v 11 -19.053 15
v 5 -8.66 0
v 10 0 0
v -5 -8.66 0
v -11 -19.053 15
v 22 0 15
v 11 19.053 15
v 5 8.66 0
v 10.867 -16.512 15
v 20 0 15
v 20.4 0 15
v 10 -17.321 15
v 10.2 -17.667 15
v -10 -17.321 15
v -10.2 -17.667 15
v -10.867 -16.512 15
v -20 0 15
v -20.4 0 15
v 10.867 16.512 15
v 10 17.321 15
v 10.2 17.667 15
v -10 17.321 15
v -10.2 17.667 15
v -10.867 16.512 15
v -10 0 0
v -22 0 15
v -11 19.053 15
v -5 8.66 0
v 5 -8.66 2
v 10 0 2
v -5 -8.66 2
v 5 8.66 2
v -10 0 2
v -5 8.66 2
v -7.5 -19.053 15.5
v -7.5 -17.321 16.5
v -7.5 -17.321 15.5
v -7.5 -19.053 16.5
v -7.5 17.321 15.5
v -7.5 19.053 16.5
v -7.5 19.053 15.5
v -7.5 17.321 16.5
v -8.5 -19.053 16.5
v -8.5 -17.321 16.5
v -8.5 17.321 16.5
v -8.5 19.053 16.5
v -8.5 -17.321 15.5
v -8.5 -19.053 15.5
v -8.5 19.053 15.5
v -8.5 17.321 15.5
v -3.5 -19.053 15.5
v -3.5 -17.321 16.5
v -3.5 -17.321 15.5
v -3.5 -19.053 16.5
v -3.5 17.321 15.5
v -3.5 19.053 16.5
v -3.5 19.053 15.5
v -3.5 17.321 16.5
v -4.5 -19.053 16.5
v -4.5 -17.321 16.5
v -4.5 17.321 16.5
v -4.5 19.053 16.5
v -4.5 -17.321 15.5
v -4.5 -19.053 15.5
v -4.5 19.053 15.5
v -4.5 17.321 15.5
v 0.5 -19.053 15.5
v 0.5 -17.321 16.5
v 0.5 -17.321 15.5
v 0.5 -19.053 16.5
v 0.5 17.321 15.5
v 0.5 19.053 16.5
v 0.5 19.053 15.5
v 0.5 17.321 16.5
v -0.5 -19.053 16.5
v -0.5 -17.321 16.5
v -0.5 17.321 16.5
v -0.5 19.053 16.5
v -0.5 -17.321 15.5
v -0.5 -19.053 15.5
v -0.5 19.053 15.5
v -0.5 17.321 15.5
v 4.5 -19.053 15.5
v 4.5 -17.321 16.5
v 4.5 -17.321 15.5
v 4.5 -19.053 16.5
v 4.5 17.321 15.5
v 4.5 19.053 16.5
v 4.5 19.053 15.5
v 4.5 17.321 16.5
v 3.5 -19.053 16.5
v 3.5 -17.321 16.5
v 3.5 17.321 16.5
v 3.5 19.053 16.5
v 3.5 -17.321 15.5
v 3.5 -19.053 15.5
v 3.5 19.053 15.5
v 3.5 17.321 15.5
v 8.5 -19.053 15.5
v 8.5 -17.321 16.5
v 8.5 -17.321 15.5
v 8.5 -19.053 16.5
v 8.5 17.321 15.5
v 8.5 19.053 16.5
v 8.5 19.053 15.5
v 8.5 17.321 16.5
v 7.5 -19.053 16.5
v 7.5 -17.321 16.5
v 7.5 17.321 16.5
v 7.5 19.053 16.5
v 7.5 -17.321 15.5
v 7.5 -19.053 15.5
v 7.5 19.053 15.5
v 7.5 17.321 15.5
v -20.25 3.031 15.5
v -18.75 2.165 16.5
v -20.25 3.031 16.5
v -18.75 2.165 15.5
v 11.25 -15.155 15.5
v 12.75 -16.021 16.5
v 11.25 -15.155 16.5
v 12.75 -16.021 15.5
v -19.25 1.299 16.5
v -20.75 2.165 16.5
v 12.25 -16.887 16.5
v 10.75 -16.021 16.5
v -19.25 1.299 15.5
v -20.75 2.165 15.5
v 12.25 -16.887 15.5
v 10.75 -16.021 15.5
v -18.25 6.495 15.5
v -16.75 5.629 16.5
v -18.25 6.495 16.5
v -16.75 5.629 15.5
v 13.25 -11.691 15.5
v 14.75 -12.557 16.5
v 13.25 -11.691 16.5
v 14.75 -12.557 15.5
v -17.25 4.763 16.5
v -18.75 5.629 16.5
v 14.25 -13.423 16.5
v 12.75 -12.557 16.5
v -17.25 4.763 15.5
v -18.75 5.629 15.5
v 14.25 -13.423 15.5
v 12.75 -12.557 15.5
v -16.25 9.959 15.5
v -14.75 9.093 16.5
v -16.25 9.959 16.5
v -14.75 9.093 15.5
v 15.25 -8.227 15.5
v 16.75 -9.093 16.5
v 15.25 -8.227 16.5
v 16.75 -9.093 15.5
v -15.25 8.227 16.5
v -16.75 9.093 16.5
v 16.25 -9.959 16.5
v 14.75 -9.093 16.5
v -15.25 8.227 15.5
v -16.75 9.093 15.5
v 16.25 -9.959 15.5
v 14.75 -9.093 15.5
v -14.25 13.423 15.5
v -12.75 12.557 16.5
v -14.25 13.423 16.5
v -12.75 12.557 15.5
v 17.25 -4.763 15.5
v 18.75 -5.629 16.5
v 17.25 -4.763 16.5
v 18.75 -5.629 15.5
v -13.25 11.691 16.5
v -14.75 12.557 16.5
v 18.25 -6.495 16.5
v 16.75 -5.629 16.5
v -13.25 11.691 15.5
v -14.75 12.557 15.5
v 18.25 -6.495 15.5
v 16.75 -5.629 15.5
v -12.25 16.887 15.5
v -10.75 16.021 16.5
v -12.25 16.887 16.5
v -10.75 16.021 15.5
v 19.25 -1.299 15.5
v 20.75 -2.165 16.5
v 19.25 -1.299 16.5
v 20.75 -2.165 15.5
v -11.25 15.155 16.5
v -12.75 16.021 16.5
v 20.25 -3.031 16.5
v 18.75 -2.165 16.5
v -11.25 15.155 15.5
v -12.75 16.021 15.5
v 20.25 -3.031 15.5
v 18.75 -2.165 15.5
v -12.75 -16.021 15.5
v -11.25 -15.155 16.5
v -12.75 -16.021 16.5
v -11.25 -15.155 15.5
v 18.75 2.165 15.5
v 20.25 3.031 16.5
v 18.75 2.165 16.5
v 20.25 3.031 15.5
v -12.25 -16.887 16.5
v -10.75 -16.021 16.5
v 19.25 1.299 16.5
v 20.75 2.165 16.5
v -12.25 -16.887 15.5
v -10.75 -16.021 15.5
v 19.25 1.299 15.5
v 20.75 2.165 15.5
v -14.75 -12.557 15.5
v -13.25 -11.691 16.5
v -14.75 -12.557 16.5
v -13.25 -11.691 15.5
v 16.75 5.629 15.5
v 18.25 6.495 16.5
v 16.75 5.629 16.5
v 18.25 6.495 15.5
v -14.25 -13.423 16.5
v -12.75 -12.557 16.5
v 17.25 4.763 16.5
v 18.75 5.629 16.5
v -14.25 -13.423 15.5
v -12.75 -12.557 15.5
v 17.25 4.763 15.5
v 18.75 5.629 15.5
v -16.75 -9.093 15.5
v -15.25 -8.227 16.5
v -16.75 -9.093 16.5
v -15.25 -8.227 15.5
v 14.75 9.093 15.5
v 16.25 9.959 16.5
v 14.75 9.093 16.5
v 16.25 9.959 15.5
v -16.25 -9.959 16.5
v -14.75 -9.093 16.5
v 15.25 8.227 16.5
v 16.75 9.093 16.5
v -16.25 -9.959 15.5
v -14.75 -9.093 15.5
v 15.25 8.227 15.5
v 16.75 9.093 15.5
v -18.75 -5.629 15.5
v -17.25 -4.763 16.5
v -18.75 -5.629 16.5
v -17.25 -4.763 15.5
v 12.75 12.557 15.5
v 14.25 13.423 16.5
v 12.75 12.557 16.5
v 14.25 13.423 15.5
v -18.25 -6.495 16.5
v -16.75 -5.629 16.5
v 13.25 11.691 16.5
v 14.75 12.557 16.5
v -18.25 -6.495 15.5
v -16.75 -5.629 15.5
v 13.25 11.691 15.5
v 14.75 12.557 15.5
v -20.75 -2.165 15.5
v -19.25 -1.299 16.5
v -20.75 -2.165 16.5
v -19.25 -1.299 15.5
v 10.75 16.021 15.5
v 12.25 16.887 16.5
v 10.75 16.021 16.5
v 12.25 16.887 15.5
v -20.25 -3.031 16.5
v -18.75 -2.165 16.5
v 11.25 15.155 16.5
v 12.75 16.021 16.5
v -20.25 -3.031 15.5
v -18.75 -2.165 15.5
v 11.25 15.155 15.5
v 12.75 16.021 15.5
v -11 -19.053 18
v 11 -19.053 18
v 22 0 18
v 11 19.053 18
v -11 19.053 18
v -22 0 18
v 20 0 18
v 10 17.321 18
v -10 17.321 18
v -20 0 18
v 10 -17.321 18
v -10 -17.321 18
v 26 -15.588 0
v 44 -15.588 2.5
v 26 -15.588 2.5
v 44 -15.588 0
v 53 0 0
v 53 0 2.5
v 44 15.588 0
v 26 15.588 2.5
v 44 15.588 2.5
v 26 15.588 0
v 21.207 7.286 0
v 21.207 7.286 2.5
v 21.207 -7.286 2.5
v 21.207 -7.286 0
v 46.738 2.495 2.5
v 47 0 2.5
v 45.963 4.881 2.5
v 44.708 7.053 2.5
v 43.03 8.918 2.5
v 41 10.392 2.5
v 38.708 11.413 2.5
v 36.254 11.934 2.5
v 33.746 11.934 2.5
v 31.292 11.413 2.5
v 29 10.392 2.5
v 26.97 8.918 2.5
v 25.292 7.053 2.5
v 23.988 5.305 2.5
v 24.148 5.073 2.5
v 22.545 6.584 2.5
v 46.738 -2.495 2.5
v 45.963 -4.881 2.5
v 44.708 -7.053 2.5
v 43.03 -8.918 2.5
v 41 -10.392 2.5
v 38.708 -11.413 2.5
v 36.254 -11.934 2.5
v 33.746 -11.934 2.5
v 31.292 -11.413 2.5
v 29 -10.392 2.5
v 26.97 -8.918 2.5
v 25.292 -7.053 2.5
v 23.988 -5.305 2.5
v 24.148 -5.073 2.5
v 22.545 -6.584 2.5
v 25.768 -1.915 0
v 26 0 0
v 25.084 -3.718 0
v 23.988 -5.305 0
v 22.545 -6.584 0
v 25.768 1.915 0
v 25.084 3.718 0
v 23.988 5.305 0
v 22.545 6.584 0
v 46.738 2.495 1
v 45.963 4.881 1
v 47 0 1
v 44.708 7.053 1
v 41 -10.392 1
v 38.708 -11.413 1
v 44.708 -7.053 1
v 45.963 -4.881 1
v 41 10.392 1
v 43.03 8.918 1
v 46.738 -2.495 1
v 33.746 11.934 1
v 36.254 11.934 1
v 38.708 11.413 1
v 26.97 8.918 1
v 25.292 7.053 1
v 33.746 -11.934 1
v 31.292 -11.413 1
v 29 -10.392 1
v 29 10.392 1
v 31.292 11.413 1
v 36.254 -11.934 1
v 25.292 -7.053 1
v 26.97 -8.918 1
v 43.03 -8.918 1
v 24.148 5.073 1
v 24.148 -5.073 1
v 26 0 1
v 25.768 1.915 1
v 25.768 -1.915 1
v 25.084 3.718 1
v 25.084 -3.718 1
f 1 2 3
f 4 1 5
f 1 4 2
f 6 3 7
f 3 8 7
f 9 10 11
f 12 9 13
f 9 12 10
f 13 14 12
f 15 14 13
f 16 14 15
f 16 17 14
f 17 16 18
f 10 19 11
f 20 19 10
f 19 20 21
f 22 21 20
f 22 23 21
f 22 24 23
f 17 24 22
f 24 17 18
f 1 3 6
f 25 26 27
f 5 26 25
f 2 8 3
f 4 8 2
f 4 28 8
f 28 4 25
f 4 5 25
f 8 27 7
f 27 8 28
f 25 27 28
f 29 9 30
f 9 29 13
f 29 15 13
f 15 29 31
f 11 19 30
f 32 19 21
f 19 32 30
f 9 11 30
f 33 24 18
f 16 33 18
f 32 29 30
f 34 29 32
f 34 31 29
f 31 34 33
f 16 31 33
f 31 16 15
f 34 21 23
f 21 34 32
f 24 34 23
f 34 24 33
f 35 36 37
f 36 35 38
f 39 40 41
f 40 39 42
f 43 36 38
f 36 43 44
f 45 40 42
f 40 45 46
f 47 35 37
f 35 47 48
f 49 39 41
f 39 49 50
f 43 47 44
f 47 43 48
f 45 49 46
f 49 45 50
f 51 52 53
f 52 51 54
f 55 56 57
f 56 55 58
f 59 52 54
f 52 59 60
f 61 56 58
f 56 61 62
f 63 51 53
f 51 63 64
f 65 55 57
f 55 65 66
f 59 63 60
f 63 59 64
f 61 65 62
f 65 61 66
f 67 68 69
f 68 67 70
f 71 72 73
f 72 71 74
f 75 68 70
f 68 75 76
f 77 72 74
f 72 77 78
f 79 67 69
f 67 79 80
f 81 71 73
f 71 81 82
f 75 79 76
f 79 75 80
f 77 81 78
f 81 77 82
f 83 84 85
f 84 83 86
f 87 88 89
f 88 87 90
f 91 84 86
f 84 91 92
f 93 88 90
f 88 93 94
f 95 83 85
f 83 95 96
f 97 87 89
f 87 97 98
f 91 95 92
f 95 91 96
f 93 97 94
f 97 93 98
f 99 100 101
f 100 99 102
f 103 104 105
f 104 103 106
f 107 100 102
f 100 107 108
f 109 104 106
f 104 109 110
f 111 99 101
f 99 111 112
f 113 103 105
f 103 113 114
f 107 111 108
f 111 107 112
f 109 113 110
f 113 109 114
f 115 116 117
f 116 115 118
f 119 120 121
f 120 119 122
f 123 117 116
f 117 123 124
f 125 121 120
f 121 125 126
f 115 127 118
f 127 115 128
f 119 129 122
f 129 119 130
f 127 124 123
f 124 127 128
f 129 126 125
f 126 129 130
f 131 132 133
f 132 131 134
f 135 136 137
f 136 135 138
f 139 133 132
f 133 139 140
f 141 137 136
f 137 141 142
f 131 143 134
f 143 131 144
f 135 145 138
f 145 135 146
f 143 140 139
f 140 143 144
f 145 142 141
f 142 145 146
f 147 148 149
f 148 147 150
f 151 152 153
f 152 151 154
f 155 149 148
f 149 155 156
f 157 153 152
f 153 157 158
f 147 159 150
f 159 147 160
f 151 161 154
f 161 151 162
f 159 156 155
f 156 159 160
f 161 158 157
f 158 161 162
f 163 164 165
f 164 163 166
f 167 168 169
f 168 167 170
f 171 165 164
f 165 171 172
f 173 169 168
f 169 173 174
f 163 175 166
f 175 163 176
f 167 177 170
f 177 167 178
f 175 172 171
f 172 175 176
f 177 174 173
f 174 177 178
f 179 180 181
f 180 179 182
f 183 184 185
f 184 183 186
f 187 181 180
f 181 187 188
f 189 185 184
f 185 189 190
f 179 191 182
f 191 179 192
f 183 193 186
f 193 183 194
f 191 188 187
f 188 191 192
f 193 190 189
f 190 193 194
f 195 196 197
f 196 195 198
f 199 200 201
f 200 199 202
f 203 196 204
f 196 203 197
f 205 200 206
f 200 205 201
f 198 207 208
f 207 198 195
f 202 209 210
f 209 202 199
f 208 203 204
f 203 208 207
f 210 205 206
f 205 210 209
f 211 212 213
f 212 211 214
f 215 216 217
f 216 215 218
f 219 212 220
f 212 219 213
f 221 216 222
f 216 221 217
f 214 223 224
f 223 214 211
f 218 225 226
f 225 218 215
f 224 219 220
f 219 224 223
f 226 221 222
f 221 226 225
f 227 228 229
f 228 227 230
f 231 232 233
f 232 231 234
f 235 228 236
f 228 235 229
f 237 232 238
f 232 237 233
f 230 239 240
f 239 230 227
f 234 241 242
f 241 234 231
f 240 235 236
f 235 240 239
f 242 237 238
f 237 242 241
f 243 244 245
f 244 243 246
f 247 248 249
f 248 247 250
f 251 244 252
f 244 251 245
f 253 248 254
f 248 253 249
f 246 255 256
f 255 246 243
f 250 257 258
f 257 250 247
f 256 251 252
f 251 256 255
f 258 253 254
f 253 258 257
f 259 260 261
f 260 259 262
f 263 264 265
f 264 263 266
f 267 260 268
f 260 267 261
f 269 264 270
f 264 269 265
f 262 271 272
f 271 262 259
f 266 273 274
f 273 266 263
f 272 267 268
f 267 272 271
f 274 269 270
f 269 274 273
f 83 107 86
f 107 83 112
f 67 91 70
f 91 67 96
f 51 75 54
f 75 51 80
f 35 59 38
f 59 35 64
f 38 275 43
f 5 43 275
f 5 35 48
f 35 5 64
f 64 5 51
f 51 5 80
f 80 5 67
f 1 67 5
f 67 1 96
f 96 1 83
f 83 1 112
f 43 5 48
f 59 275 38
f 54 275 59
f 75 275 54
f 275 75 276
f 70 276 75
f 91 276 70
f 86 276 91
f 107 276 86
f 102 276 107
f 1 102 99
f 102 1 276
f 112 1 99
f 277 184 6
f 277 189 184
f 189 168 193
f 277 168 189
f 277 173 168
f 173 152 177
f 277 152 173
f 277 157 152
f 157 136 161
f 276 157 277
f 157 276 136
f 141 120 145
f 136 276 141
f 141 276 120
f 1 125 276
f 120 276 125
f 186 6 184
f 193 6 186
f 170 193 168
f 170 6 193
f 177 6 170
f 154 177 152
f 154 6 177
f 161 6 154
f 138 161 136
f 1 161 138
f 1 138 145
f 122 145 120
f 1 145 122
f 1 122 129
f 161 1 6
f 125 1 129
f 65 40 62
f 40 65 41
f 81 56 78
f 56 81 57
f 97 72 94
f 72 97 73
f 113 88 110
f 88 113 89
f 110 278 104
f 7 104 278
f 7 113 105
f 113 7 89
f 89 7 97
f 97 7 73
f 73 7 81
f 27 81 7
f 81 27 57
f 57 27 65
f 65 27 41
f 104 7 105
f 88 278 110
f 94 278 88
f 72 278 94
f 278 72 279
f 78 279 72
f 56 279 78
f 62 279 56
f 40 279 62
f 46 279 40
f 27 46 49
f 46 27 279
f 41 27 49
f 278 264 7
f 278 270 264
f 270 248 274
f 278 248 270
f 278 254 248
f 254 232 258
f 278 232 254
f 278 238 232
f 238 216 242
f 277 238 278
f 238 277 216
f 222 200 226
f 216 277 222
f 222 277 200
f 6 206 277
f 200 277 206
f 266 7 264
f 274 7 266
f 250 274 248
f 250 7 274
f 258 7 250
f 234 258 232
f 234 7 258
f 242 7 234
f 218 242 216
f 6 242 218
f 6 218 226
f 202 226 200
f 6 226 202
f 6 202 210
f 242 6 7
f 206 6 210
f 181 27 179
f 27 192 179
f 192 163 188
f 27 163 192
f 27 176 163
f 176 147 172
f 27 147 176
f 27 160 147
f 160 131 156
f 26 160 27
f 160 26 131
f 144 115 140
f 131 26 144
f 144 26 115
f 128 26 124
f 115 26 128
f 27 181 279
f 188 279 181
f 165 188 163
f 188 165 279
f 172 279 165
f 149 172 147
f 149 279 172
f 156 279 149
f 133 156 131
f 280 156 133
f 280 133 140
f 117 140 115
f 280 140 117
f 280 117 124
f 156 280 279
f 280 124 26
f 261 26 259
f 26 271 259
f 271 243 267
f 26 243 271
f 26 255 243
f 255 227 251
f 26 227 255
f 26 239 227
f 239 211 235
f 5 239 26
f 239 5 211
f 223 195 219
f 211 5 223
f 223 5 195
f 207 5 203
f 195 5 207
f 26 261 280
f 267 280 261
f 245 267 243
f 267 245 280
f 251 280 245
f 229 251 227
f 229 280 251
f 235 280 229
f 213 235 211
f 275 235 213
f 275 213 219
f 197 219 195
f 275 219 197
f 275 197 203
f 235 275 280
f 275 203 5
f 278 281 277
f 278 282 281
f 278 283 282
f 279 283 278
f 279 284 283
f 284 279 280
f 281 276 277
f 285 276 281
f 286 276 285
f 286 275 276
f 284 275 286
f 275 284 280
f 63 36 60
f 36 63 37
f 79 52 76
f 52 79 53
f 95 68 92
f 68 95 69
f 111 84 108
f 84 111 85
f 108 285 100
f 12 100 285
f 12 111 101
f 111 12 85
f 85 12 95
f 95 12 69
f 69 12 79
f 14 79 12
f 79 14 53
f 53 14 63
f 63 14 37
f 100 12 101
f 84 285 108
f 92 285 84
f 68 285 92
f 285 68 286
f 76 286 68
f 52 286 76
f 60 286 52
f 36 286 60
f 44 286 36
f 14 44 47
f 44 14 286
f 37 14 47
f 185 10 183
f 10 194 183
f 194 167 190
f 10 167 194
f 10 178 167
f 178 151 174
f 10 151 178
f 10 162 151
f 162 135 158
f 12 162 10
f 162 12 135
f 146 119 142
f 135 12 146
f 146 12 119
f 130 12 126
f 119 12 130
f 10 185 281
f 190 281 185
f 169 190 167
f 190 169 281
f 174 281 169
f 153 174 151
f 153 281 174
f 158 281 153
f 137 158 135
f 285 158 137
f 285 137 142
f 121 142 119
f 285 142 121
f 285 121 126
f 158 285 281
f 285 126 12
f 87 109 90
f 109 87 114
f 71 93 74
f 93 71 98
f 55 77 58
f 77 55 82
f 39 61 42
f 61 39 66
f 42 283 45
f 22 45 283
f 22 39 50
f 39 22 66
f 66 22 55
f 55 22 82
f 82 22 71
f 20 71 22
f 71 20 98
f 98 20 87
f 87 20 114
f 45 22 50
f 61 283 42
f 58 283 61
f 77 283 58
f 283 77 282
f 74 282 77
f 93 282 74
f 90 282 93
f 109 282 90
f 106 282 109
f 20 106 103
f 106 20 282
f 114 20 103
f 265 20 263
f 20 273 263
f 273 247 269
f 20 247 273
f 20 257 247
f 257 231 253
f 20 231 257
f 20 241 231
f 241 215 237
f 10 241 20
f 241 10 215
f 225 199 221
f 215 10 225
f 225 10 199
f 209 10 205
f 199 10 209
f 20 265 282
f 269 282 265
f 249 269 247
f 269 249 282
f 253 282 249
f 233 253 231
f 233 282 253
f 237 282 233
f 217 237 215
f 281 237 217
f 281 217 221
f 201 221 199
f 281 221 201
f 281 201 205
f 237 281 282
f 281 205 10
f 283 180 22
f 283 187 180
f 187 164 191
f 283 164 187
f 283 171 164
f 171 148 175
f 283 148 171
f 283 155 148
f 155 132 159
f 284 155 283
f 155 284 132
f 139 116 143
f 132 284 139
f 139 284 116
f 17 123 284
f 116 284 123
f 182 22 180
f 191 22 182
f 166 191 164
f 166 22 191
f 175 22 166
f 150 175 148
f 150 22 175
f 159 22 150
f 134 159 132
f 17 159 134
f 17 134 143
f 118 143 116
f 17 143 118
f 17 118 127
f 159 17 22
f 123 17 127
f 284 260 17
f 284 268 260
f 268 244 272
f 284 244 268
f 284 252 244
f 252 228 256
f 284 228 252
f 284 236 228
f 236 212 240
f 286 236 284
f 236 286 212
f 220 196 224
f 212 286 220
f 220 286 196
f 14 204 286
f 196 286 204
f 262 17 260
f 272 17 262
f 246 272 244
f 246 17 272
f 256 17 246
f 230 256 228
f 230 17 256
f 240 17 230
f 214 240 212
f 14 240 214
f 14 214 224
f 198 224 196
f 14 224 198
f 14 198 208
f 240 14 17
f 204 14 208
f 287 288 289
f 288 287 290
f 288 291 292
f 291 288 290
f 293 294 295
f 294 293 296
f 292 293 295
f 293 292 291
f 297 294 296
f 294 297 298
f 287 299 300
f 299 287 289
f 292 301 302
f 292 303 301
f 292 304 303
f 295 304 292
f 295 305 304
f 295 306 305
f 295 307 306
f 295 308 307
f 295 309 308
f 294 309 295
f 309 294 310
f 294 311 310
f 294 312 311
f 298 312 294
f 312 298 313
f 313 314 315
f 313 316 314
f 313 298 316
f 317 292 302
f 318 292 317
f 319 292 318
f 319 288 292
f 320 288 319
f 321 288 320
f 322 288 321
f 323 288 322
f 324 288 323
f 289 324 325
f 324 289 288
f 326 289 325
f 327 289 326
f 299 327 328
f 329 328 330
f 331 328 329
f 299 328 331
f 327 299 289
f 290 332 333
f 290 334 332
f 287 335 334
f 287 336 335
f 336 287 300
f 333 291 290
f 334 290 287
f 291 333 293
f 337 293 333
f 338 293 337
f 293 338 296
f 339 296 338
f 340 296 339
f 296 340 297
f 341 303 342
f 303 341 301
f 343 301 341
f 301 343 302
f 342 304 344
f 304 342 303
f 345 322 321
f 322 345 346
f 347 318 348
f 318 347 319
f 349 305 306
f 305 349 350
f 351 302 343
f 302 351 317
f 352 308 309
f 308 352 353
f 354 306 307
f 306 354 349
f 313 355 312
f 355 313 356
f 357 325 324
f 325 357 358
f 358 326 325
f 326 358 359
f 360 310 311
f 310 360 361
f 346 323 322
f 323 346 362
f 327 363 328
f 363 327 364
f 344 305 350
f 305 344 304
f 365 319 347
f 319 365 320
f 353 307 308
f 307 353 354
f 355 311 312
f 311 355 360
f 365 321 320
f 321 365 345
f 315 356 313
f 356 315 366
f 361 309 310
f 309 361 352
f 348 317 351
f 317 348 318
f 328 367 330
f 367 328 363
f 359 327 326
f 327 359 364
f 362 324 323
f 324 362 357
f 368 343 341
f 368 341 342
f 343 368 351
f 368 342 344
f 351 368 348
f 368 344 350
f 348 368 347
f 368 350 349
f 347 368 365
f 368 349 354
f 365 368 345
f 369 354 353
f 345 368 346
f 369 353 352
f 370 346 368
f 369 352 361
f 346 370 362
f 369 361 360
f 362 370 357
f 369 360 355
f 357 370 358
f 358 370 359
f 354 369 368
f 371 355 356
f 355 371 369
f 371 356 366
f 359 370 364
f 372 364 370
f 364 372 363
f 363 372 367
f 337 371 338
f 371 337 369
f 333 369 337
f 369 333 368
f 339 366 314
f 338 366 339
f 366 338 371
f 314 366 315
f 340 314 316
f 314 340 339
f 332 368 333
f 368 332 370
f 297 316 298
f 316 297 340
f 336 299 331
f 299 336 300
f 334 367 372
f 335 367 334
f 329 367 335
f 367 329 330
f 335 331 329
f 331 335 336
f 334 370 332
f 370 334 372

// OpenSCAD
// Shapes

// Center a shape with center=true

// Shield

// MUST use render() with the difference() function
// Renders first thing, subtracts each subsequent thing
render() difference()
{
	// $fa = angle of face
	cylinder(r1=10, r2=22, h=15, $fa=60 );

// Shield interior
	translate([0,0,2]) cylinder(r1=10, r2=22, h=15, $fa=60 );
}

// Interior void 

translate([0,0,15])
	render() difference()
	{
		cylinder(r=22, h=3, $fa=60);
		cylinder(r=20, h=3, $fa=60);
	
		// Bottom sewable flange
		
		// make holes, face1
		// for (i = [start:step:end]) { … }
		for (trans = [-8:4:8]){
			translate([trans,0,1])
				cube([1,45,1], center=true);
		}

		// make holes, face2
		rotate([0,0,60])
			for (trans = [-8:4:8]){
				translate([trans,0,1])
					cube([1,45,1], center=true);
			}

		// make holes, face3
		rotate([0,0,120])
			for (trans = [-8:4:8]){
				translate([trans,0,1])
					cube([1,45,1], center=true);
			}
	}

// Interior plate

render() difference()
{
	translate([35,0,0])
		cylinder(r=18, h=2.5, $fa=60);
		translate([35,0,1])
			cylinder(r=12, h=2);
	translate([18,0,0])
		cylinder(r=8,h=2.5);
}
